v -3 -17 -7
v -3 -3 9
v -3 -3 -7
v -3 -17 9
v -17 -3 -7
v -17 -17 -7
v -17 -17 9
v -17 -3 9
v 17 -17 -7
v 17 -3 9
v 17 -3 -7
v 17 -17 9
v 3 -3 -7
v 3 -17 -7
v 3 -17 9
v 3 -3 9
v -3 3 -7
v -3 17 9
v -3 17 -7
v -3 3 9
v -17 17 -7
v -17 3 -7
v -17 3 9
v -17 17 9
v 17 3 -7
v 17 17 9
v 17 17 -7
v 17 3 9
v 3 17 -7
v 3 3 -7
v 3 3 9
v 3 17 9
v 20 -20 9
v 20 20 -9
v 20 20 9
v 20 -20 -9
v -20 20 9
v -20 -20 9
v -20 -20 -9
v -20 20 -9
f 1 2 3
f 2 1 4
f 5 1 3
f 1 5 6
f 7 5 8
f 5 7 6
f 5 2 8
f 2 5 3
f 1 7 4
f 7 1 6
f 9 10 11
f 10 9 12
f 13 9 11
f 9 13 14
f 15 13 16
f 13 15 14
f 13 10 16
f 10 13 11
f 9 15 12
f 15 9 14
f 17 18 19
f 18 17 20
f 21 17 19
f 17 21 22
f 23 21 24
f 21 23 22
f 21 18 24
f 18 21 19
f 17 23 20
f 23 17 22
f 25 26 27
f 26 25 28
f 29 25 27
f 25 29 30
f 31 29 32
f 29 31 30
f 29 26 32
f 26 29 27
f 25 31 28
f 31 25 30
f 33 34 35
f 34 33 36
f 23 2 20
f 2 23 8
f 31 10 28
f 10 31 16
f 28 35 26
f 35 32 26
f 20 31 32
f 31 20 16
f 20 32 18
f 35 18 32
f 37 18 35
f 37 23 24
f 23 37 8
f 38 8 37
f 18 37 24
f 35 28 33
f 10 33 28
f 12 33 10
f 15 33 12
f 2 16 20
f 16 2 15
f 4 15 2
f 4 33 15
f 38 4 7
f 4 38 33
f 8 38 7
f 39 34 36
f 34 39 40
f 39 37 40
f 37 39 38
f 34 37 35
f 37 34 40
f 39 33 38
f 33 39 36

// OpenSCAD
$fn = 32;

// ----------------------------------------------------------------------
// Pocket plate 40 x 40 x 18
// 2 x 2 pockets 14 mm square, 16 mm deep
// ----------------------------------------------------------------------

// --- parameters (mm) ---
thickness = 18;   // plate thickness
seat_tol = 0.15;  // tolerance at the seating features
free_tol = 0.5;   // general tolerance on the free sizes
floor_t = 2;      // material left under each pocket
pocket = 14;      // pocket side length
pitch_x = 20;     // pocket pitch along X
pitch_y = 20;     // pocket pitch along Y
cols = 2;         // pockets per row
rows = 2;         // rows of pockets

// --- derived feature positions (mm) ---
depth = thickness - floor_t;        // = 16   pocket depth, down to the floor
span_x = (cols - 1) * pitch_x;      // = 20   distance between outer pockets
span_y = (rows - 1) * pitch_y;      // = 20   distance between outer pocket rows
origin_x = -span_x / 2;             // = -10   X of the first pocket
origin_y = -span_y / 2;             // = -10   Y of the first pocket
plate = [span_x + pocket + 6, span_y + pocket + 6, thickness];  // = [40, 40, 18]   overall size: pockets plus 3 mm of wall on each side
feature_centers = [
  [origin_x + 0 * pitch_x, origin_y + 0 * pitch_y],
  [origin_x + 1 * pitch_x, origin_y + 0 * pitch_y],
  [origin_x + 0 * pitch_x, origin_y + 1 * pitch_y],
  [origin_x + 1 * pitch_x, origin_y + 1 * pitch_y]
];   // pocket centres, used verbatim by the cutter loop

// plate outline, then one pocket per centre in feature_centers
difference() {
  cube(plate, center = true);
  for (centre = feature_centers)
    translate([centre[0] - pocket / 2, centre[1] - pocket / 2, plate[2] / 2 - depth])
      cube([pocket, pocket, depth + 1]);  // centred on the declared pocket centre
}
